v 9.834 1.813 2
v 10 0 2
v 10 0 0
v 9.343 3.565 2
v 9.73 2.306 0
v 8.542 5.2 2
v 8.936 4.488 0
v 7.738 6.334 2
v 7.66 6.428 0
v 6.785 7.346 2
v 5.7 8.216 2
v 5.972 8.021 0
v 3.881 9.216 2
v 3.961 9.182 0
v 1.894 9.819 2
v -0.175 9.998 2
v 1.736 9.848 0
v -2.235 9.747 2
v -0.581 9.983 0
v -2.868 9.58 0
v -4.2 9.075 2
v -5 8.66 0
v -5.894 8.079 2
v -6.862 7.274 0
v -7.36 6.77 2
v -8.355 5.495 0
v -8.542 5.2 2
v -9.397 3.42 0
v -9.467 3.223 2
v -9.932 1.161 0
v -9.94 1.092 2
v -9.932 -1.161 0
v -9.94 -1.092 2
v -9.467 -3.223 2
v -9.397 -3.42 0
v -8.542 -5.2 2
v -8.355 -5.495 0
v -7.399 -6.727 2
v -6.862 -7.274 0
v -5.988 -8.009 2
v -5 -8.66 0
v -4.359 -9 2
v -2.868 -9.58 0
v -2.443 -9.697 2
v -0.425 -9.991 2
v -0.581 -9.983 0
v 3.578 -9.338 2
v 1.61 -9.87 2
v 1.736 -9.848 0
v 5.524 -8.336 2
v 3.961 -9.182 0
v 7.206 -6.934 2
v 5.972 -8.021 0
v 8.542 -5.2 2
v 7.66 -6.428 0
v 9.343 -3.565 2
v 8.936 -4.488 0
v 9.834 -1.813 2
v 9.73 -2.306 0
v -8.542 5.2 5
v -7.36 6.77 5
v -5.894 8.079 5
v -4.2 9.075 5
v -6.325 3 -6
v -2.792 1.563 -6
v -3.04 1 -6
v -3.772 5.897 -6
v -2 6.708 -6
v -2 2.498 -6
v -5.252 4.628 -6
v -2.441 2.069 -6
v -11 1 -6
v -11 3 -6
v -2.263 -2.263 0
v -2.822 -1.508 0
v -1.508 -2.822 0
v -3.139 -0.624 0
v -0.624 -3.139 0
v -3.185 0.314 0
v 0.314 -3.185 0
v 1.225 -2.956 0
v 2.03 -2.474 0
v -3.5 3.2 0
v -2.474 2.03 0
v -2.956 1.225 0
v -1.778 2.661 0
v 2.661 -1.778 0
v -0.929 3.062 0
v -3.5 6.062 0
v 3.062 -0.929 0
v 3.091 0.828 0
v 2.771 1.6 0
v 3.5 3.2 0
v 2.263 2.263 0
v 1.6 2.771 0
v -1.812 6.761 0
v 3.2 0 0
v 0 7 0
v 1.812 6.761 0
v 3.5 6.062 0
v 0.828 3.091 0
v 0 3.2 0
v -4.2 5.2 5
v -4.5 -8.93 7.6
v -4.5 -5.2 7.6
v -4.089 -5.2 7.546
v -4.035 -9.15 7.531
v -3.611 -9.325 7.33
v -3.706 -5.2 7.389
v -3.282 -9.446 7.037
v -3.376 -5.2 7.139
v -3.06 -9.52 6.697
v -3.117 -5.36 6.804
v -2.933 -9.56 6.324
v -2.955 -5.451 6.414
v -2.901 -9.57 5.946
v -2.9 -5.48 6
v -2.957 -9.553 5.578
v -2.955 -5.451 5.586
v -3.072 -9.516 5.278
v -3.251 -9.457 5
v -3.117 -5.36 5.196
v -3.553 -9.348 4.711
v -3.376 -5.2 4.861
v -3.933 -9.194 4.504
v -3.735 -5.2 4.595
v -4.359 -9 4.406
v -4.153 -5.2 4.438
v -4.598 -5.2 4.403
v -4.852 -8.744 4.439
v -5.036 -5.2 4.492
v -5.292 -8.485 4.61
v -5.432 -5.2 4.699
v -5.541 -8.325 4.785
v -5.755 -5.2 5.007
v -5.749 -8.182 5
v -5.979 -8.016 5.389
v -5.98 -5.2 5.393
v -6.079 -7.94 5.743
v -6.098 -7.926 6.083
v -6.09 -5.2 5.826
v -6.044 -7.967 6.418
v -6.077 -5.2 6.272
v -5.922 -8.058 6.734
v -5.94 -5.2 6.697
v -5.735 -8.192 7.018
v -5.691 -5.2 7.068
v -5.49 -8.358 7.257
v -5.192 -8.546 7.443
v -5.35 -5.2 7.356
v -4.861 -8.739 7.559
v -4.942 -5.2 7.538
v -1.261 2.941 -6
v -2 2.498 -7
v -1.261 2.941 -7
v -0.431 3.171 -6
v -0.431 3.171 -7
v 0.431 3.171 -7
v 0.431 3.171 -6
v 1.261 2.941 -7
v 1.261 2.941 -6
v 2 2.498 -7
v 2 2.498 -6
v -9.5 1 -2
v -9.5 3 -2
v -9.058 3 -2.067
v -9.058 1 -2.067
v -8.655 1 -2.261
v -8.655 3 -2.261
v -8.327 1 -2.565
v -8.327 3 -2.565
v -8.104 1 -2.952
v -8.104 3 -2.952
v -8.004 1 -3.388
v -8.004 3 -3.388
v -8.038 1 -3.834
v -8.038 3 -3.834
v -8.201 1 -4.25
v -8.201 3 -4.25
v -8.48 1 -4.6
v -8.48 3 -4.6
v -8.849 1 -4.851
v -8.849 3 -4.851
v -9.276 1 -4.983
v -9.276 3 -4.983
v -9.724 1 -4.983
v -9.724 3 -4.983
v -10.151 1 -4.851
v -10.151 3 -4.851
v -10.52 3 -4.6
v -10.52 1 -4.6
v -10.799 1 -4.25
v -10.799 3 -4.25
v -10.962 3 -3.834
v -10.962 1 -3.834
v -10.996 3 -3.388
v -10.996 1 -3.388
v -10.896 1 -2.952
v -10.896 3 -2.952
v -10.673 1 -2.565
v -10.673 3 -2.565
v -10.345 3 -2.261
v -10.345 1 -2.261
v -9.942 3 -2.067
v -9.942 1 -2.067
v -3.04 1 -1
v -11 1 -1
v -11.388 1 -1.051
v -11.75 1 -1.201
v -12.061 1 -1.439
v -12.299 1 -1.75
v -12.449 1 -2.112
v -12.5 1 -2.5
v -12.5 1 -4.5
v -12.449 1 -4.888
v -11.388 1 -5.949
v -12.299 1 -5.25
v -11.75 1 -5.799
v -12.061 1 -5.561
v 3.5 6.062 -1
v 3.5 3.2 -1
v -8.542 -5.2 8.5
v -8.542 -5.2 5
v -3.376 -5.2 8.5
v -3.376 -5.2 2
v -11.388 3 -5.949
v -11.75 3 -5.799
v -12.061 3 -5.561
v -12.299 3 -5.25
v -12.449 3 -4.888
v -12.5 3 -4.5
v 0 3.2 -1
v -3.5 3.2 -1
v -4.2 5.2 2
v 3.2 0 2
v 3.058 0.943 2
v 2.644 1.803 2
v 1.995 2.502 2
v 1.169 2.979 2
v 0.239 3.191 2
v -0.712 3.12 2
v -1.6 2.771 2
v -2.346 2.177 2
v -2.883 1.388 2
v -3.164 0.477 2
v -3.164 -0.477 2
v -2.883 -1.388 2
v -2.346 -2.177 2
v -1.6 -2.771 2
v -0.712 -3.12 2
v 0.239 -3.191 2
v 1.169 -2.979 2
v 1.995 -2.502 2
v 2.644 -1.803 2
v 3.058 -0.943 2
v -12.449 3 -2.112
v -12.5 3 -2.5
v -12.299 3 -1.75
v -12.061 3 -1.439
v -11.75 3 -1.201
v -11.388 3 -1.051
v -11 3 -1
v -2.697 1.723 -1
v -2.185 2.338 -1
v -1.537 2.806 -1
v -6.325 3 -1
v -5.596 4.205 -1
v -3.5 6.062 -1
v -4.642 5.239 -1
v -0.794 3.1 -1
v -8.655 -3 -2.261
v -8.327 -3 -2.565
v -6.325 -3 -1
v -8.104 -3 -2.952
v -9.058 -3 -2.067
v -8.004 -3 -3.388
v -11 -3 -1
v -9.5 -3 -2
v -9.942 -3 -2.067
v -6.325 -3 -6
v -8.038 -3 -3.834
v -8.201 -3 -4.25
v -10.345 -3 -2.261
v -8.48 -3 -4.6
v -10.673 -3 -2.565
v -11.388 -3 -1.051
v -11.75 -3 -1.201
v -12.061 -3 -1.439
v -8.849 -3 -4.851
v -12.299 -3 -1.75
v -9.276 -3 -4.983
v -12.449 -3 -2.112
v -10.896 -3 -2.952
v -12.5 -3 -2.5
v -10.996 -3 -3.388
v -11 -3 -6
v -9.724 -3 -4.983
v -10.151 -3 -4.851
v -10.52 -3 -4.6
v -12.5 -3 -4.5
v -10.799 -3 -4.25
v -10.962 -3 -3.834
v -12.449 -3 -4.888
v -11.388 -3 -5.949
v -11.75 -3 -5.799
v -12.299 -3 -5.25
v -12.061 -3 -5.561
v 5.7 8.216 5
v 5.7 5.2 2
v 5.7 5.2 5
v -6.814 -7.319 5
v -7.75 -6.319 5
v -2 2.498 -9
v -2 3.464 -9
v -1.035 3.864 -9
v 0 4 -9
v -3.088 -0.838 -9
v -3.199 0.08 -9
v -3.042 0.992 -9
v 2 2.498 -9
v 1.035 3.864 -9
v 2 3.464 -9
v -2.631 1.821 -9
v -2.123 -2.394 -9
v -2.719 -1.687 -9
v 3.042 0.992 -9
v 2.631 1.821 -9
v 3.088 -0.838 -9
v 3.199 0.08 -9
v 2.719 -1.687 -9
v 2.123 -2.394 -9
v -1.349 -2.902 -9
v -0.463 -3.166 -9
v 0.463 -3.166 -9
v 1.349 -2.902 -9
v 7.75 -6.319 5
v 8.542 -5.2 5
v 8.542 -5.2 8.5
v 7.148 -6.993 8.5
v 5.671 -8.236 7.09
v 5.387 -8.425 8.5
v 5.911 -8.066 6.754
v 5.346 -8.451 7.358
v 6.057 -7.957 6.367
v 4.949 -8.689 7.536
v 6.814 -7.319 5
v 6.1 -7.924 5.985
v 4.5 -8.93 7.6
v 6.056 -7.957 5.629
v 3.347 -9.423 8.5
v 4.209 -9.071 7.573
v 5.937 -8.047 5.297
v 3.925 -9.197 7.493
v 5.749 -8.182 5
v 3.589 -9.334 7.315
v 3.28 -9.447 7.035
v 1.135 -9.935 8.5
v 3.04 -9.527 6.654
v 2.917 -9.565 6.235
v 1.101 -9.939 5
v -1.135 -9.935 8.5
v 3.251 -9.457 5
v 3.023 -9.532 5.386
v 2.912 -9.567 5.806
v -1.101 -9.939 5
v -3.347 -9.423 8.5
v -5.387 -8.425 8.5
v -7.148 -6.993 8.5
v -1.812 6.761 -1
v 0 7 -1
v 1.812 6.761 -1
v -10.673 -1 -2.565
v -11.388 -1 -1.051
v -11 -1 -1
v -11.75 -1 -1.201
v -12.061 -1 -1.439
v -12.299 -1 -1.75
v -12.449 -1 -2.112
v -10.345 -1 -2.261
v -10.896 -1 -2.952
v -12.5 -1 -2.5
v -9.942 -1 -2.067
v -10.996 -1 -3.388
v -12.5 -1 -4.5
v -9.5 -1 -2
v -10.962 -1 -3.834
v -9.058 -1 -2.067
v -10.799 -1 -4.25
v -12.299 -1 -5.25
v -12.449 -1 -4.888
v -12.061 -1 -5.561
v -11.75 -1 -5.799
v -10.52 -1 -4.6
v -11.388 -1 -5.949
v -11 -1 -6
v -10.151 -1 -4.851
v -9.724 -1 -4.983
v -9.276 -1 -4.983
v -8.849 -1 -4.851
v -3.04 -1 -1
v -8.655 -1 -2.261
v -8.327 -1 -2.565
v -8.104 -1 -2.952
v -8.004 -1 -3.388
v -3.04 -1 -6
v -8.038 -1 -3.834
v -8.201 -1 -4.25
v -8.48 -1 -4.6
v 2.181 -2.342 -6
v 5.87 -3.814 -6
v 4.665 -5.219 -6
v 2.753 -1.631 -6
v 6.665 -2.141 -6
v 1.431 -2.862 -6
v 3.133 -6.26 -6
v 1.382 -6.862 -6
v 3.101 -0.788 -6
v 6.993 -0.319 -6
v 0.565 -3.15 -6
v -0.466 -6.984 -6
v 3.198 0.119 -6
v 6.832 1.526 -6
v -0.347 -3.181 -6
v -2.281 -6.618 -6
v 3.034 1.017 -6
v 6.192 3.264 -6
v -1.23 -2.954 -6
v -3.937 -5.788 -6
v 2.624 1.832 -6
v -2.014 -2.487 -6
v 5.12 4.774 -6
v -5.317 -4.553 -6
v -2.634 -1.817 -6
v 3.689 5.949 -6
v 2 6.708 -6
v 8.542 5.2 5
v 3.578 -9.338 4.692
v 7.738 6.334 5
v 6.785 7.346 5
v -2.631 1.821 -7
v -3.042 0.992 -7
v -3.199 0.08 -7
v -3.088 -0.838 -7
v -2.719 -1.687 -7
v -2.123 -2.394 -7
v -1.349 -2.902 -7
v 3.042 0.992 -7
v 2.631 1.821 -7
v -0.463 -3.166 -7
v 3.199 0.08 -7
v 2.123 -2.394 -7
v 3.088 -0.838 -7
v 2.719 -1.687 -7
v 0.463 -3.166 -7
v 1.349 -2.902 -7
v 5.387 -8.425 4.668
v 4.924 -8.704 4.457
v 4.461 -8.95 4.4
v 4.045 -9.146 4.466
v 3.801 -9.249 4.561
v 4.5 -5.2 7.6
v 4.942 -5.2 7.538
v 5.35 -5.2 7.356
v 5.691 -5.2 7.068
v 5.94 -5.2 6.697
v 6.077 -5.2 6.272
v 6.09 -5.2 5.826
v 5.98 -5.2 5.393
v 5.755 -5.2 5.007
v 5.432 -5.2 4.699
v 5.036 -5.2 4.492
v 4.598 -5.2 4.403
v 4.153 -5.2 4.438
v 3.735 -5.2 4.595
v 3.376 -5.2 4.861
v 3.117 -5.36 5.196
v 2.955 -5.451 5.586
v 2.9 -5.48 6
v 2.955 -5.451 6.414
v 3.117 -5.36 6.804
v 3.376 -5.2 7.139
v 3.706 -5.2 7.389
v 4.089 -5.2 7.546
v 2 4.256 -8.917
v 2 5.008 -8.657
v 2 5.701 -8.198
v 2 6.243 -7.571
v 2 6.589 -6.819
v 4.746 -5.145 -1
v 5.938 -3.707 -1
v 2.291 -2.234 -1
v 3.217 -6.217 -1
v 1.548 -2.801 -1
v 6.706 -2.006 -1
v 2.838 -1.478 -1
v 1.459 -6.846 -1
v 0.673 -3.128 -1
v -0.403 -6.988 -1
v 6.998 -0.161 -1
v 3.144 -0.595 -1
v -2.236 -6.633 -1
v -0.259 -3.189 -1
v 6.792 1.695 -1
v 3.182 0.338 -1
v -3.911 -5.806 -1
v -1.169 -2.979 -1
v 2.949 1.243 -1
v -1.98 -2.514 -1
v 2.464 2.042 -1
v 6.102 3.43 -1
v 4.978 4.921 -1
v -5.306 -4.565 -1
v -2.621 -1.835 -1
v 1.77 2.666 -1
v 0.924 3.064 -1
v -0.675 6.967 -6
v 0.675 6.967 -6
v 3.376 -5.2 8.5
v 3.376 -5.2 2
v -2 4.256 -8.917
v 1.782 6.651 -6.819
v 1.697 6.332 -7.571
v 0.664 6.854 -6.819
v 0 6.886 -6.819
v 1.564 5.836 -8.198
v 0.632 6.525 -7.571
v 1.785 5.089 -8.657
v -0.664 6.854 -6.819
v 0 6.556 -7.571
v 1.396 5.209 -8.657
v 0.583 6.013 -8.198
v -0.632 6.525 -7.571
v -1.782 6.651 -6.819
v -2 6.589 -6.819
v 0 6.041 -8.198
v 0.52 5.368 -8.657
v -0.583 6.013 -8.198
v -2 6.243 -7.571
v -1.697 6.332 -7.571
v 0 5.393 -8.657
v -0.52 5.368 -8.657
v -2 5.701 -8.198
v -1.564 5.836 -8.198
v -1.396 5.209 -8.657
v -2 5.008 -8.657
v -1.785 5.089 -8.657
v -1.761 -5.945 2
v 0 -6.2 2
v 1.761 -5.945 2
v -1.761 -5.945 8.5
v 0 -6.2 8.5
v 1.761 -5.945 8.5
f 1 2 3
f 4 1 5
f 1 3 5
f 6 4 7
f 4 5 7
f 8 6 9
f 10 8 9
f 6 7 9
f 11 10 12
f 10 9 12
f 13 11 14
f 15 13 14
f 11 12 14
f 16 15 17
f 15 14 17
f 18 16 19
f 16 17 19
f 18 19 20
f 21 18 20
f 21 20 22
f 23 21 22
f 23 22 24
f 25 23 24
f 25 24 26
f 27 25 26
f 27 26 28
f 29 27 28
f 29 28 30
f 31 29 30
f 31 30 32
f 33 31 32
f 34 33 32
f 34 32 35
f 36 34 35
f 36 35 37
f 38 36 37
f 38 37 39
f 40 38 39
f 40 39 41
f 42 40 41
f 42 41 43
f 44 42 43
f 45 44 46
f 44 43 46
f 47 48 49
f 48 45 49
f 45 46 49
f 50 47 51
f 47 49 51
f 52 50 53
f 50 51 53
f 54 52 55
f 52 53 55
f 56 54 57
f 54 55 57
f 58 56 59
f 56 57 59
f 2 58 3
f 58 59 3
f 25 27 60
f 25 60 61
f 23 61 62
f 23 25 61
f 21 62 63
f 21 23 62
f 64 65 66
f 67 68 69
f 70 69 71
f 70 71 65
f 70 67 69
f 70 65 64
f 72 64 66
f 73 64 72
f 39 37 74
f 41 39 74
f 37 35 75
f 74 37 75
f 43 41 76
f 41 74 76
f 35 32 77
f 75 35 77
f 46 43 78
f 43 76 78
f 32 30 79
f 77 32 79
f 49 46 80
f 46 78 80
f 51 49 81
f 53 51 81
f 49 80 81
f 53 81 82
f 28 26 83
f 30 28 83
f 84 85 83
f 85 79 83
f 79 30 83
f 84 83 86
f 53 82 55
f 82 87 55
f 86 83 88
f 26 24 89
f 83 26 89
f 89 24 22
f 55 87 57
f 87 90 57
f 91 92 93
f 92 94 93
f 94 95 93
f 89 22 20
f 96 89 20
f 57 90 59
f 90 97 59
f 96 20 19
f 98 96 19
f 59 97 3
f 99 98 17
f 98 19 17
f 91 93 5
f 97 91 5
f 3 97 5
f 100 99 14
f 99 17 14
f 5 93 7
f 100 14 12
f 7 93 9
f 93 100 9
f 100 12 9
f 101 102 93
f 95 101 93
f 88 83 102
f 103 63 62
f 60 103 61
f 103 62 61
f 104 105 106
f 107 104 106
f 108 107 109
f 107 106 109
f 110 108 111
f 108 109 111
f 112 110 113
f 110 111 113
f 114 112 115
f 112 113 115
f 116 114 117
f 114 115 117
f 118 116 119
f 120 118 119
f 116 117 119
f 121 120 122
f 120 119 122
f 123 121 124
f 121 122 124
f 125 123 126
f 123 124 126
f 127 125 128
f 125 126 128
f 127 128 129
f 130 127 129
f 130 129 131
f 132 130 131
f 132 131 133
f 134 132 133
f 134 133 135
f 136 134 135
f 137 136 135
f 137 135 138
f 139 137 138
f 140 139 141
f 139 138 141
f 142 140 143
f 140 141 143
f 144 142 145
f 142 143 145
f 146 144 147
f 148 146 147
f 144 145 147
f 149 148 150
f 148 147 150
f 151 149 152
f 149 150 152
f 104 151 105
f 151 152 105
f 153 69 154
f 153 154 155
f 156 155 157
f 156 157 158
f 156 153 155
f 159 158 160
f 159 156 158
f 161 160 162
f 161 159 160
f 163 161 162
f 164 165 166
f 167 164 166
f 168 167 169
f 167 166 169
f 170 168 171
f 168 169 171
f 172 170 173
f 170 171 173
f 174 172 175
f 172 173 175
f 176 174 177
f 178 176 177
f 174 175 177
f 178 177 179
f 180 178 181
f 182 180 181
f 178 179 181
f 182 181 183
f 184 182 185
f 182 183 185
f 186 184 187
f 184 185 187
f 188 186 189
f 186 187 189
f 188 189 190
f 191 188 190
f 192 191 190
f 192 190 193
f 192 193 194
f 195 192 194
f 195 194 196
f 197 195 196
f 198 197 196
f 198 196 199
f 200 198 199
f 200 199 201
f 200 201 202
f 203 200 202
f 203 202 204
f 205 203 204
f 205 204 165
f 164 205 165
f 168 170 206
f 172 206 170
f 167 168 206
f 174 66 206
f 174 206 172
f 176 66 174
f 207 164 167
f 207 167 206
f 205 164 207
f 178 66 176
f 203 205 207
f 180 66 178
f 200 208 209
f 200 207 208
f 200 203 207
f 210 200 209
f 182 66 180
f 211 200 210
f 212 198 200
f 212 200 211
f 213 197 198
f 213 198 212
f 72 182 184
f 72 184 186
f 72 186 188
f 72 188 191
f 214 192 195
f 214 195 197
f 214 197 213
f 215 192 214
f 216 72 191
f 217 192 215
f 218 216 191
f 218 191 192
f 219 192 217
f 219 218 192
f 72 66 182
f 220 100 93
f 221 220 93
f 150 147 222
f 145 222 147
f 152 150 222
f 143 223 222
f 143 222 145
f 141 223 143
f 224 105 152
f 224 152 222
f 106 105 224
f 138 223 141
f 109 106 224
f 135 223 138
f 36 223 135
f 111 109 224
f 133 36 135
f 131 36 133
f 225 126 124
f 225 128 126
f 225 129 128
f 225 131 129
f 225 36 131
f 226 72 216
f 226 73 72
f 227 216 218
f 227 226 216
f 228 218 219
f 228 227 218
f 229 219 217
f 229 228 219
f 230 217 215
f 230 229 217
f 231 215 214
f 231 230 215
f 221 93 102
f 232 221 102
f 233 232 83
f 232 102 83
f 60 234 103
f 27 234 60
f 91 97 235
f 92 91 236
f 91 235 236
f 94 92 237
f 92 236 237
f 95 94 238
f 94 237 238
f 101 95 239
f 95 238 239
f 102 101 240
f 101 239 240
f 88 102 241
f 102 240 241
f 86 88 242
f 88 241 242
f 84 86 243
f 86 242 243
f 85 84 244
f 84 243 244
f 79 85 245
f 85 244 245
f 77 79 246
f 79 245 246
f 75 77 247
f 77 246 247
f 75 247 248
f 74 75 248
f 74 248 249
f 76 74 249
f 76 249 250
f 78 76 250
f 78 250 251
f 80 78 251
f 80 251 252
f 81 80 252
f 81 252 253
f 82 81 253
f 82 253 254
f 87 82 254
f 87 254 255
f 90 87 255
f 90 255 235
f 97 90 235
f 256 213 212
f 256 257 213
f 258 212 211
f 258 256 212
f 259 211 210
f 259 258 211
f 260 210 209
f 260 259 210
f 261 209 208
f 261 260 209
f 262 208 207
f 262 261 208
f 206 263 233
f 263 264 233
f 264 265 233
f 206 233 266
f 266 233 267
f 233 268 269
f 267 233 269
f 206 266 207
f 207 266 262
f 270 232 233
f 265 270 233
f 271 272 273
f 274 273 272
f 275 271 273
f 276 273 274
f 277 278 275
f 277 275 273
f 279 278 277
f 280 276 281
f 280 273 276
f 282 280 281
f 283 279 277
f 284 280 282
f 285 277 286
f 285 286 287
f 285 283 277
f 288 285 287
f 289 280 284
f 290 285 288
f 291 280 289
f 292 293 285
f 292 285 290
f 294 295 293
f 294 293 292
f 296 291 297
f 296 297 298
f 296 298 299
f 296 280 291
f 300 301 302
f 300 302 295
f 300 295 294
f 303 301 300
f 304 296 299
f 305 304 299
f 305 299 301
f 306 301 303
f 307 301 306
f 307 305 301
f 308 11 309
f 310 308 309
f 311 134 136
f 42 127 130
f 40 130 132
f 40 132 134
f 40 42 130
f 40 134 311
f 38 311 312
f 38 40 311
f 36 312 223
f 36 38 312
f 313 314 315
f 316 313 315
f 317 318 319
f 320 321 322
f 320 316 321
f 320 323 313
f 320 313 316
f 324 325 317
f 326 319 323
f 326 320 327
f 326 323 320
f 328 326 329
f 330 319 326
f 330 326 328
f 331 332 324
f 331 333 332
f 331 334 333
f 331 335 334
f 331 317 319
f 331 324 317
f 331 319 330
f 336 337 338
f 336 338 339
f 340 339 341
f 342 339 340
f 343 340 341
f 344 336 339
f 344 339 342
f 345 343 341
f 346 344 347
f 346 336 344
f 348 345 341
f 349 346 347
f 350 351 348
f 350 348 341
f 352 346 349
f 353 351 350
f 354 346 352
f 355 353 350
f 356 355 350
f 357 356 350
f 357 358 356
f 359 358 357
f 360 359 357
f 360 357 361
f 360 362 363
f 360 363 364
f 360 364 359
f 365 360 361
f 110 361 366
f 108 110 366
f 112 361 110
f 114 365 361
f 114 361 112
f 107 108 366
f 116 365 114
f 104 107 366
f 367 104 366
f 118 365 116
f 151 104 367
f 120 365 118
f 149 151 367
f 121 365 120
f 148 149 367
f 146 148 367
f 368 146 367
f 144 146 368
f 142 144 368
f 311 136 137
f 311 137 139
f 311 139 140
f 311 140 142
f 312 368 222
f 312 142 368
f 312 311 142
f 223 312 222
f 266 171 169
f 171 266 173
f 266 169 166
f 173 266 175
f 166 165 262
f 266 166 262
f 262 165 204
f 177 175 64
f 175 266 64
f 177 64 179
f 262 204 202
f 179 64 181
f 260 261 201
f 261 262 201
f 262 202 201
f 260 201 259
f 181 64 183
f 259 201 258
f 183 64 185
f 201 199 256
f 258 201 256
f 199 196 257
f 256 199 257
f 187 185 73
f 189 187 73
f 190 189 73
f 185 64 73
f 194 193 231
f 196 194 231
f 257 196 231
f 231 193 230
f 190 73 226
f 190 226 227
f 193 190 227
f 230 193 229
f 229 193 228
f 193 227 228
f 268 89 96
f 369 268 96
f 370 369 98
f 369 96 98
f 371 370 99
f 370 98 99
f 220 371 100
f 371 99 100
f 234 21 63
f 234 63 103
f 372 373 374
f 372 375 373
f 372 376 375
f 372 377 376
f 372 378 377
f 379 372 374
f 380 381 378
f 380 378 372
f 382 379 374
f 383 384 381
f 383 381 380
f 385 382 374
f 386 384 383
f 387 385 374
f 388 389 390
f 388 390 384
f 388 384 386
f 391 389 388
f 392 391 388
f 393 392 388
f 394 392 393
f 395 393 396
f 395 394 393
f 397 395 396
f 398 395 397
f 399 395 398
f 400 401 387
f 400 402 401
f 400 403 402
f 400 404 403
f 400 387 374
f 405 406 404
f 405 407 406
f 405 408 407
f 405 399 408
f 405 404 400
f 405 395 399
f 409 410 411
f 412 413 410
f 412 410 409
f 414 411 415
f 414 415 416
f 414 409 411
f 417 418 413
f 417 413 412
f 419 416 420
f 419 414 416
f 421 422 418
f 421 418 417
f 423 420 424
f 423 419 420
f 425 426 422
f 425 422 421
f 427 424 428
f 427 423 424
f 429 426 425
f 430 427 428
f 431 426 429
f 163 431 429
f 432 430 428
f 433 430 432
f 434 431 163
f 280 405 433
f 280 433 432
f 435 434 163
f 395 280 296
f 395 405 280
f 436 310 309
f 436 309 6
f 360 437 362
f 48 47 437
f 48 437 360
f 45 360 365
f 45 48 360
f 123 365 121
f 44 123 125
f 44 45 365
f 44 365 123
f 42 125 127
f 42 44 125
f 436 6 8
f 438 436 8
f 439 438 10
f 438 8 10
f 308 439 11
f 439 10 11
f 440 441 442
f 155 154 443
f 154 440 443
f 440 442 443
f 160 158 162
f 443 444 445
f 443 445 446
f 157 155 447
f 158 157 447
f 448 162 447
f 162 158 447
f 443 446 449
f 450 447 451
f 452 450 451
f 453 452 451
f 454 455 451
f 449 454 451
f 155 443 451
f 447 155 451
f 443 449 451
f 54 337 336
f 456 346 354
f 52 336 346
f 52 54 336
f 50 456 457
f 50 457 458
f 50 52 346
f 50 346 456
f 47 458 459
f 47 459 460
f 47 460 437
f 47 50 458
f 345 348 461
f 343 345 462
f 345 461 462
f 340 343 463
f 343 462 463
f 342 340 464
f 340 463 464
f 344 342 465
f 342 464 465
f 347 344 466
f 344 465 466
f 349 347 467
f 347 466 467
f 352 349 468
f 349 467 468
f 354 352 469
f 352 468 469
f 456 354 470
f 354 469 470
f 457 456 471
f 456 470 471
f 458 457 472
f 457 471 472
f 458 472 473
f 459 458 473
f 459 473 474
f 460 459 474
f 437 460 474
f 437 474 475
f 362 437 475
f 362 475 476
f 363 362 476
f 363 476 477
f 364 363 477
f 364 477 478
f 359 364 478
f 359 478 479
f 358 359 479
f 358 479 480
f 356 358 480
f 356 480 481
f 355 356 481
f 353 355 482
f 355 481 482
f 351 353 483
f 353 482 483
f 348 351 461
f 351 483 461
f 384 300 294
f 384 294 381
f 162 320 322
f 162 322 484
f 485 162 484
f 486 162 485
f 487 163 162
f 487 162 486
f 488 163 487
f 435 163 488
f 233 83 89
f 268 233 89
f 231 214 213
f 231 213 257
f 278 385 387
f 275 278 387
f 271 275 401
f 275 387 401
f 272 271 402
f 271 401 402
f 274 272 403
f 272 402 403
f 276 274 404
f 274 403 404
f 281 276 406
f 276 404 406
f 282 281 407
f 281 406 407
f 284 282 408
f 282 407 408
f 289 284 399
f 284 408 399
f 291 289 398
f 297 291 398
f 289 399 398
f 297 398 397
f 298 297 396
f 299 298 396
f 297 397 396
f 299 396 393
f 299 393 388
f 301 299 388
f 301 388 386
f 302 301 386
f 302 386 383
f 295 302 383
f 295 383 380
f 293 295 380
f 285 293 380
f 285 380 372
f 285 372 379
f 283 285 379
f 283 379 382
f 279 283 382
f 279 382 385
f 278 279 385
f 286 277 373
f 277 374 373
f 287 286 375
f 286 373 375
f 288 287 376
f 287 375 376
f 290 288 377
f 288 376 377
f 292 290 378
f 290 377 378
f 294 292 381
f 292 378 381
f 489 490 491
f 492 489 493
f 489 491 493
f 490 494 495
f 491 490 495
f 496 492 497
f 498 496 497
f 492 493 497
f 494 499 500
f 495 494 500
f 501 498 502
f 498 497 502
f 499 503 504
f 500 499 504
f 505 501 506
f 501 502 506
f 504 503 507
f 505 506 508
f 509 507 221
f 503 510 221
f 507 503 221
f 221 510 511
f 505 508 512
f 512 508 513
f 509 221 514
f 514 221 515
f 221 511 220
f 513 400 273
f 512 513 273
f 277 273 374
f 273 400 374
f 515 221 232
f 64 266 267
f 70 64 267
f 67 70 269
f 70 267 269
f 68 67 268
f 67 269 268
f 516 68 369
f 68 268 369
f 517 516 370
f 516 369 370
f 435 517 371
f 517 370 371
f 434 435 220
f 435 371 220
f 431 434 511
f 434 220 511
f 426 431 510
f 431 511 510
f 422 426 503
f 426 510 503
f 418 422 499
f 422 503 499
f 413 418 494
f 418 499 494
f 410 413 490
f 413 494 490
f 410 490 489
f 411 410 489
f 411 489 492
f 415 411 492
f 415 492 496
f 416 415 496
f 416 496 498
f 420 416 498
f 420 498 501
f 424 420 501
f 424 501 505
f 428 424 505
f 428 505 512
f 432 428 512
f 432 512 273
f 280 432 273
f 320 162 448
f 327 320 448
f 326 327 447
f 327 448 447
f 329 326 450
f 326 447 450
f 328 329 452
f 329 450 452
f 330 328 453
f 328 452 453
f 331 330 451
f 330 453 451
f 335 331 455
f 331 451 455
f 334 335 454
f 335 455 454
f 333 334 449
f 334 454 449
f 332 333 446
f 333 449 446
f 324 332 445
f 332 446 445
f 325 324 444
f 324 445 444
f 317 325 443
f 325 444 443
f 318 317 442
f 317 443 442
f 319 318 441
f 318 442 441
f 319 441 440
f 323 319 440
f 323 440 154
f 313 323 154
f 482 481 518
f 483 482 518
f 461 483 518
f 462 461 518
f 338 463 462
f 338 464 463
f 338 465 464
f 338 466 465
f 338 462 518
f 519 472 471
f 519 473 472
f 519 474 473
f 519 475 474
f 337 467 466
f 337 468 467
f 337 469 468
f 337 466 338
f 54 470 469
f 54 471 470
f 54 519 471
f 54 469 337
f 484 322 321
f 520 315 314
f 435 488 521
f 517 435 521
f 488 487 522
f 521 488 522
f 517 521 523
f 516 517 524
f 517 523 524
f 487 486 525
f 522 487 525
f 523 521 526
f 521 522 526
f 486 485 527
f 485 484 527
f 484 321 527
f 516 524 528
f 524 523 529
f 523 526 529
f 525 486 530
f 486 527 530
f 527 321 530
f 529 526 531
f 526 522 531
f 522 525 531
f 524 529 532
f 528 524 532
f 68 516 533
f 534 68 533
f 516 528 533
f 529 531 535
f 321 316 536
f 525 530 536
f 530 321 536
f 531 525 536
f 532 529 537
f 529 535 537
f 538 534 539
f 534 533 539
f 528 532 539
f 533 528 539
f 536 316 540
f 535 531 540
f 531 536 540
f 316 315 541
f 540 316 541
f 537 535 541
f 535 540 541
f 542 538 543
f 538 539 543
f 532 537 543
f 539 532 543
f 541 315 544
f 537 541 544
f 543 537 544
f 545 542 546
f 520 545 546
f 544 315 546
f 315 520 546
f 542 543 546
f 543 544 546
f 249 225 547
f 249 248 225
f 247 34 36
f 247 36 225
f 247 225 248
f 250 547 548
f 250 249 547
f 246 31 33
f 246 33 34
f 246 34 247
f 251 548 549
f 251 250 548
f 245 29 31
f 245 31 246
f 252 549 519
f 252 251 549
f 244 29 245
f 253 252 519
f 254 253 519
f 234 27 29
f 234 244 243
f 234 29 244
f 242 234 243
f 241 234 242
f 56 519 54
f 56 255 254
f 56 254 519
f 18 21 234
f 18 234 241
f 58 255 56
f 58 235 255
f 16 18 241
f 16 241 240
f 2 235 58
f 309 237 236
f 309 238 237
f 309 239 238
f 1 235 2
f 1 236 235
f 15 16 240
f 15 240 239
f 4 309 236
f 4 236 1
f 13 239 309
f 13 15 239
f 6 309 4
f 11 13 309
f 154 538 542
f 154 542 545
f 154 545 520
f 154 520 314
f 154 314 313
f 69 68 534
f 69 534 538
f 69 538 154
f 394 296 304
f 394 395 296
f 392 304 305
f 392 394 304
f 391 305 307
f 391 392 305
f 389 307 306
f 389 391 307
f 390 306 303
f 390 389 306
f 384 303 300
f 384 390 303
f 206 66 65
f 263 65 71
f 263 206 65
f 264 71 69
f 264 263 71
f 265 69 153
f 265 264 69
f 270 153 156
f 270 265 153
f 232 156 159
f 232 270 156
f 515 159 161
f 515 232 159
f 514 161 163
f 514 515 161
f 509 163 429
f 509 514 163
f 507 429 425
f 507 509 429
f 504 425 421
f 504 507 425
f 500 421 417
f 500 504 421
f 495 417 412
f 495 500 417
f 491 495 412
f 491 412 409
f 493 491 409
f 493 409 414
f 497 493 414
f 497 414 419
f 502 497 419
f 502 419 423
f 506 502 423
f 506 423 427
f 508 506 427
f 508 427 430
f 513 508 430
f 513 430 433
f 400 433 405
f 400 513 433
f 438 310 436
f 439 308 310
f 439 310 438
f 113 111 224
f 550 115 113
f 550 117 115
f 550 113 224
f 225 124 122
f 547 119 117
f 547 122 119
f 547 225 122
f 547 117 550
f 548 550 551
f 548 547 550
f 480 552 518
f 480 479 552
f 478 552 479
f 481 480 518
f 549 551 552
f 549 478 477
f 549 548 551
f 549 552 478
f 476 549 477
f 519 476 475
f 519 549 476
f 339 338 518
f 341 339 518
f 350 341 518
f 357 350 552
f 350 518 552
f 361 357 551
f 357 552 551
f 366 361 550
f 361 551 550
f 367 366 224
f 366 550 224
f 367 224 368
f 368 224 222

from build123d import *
from build123d.topology import SkipClean

# Parameters (mm, degrees)
SKETCH_1_R          = 10
EXTRUDE_1_DEPTH     = 2
EXTRUDE_2_DEPTH     = 3
SKETCH_3_R          = 3.2
CUT_EXTRUDE_1_DEPTH = 3
EXTRUDE_3_DEPTH     = 1
SKETCH_6_R          = 7
SKETCH_6_R_2        = 3.2
EXTRUDE_4_DEPTH     = 5
SKETCH_7_W          = 8.062767077
SKETCH_7_H          = 6
EXTRUDE_5_DEPTH     = 5
SKETCH_8_R          = 1.5
CUT_EXTRUDE_3_DEPTH = 20.006577809
CUT_EXTRUDE_4_DEPTH = 5
FILLET_7_R          = 1.5
EXTRUDE_6_DEPTH     = 3
EXTRUDE_START       = -2
SKETCH_12_R         = 3.2
EXTRUDE_7_DEPTH     = 2
FILLET_8_R          = 3
EXTRUDE_8_DEPTH     = 3.5
SKETCH_14_R         = 1.6
CUT_EXTRUDE_5_DEPTH = 22.640009284


with BuildPart() as part:
    # 草图1 → 凸台-拉伸1 (new body)
    with BuildSketch(Plane.XY):
        Circle(SKETCH_1_R)
    extrude(amount=EXTRUDE_1_DEPTH)

    # 草图2 → 凸台-拉伸2 (add)
    with SkipClean():  # the faces are left unmerged after this step: merging them gives an invalid solid
        with BuildSketch(Plane.XY.offset(2)):
            with BuildLine():
                Line((3.376388603, -5.2), (8.541662602, -5.2))
                ThreePointArc((8.541662602, -5.2), (6.403471398, -7.680856336), (3.578411207, -9.337824866))
                ThreePointArc((3.578411207, -9.337824866), (-0.425231333, -9.990954825), (-4.358898944, -9))
                ThreePointArc((-4.358898944, -9), (-6.724293423, -7.401613199), (-8.541662602, -5.2))
                Line((-8.541662602, -5.2), (-3.376388603, -5.2))
                ThreePointArc((-3.376388603, -5.2), (0, -6.2), (3.376388603, -5.2))
            make_face()
            with BuildLine():
                Line((-4.2, 5.2), (-8.541662602, 5.2))
                ThreePointArc((-8.541662602, 5.2), (-6.658968745, 7.460438007), (-4.2, 9.075241044))
                Line((-4.2, 9.075241044), (-4.2, 5.2))
            make_face()
            with BuildLine():
                Line((5.7, 5.2), (8.541662602, 5.2))
                ThreePointArc((8.541662602, 5.2), (7.278803227, 6.857041897), (5.7, 8.216446921))
                Line((5.7, 8.216446921), (5.7, 5.2))
            make_face()
        extrude(amount=EXTRUDE_2_DEPTH)

    # 草图3 → 切除-拉伸1 (cut)
    with SkipClean():  # the faces are left unmerged after this step: merging them gives an invalid solid
        with BuildSketch(Plane.XY.offset(2)):
            Circle(SKETCH_3_R)
        extrude(amount=-CUT_EXTRUDE_1_DEPTH, mode=Mode.SUBTRACT)

    # 草图5 → 凸台-拉伸3 (add)
    with SkipClean():  # the faces are left unmerged after this step: merging them gives an invalid solid
        with BuildSketch(Plane(origin=(0, 0, 0), x_dir=(-1, 0, 0), z_dir=(0, 0, -1))):
            with BuildLine():
                Line((-3.5, 6.062177826), (-3.5, 3.2))
                Line((-3.5, 3.2), (3.5, 3.2))
                Line((3.5, 3.2), (3.5, 6.062177826))
                ThreePointArc((3.5, 6.062177826), (0, 7), (-3.5, 6.062177826))
            make_face()
        extrude(amount=EXTRUDE_3_DEPTH)

    # 草图6 → 凸台-拉伸4 (add)
    with SkipClean():  # the faces are left unmerged after this step: merging them gives an invalid solid
        with BuildSketch(Plane(origin=(0, 0, -1), x_dir=(-1, 0, 0), z_dir=(0, 0, -1))):
            with Locations(Location((0, 0, 0), (0, 0, 120))):
                Circle(SKETCH_6_R)
            with Locations(Location((0, 0, 0), (0, 0, 180))):
                Circle(SKETCH_6_R_2, mode=Mode.SUBTRACT)
        extrude(amount=EXTRUDE_4_DEPTH)

    # 草图7 → 凸台-拉伸5 (add)
    with SkipClean():  # the faces are left unmerged after this step: merging them gives an invalid solid
        with BuildSketch(Plane(origin=(0, 0, -6), x_dir=(-1, 0, 0), z_dir=(0, 0, -1))):
            with Locations((8.468616461, 0)):
                Rectangle(SKETCH_7_W, SKETCH_7_H)
        extrude(amount=-EXTRUDE_5_DEPTH)

    # 草图8 → 切除-拉伸3 (cut, through all)
    with SkipClean():  # the faces are left unmerged after this step: merging them gives an invalid solid
        with BuildSketch(Plane(origin=(0, 3, 0), x_dir=(1, 0, 0), z_dir=(0, 1, 0))):
            with Locations(Location((-9.5, 3.5, 0), (0, 0, 270))):
                Circle(SKETCH_8_R)
        extrude(amount=-CUT_EXTRUDE_3_DEPTH, mode=Mode.SUBTRACT)

    # 草图9 → 切除-拉伸4 (cut)
    with SkipClean():  # the faces are left unmerged after this step: merging them gives an invalid solid
        with BuildSketch(Plane(origin=(0, 0, -6), x_dir=(-1, 0, 0), z_dir=(0, 0, -1))):
            Polygon((0, 0), (0, 1), (12.5, 1), (12.5, -1), (0, -1), align=None)
        extrude(amount=-CUT_EXTRUDE_4_DEPTH, mode=Mode.SUBTRACT)

    # 圆角7
    fillet_7_edges = [part.edges().sort_by_distance(p)[0] for p in [
        (-12.5, 2, -1),
        (-12.5, -2, -1),
        (-12.5, -2, -6),
        (-12.5, 2, -6),
    ]]
    fillet(fillet_7_edges, radius=FILLET_7_R)

    # 草图10 → 凸台-拉伸6 (add)
    with BuildSketch(Plane(origin=(0, 0, -6), x_dir=(-1, 0, 0), z_dir=(0, 0, -1))):
        with BuildLine():
            Line((2, 6.708203932), (2, 2.497999199))
            ThreePointArc((2, 2.497999199), (0, 3.2), (-2, 2.497999199))
            Line((-2, 2.497999199), (-2, 6.708203932))
            ThreePointArc((-2, 6.708203932), (0, 7), (2, 6.708203932))
        make_face()
    extrude(amount=EXTRUDE_6_DEPTH)

    # 草图12 → 凸台-拉伸7 (add)
    with BuildSketch(Plane(origin=(0, 0, -9), x_dir=(-1, 0, 0), z_dir=(0, 0, -1)).offset(EXTRUDE_START)):
        with Locations(Location((0, 0, 0), (0, 0, 180))):
            Circle(SKETCH_12_R)
    extrude(amount=EXTRUDE_7_DEPTH)

    # 圆角8
    fillet_8_edges = [part.edges().sort_by_distance(p)[0] for p in [
        (0, 7, -9),
    ]]
    fillet(fillet_8_edges, radius=FILLET_8_R - 0.0001)  # a hair under: the kernel refuses the full size

    # 草图13 → 凸台-拉伸8 (add)
    with BuildSketch(Plane.XY.offset(5)):
        with BuildLine():
            Line((3.376388603, -5.2), (8.541662602, -5.2))
            ThreePointArc((8.541662602, -5.2), (0, -10), (-8.541662602, -5.2))
            Line((-8.541662602, -5.2), (-3.376388603, -5.2))
            ThreePointArc((-3.376388603, -5.2), (0, -6.2), (3.376388603, -5.2))
        make_face()
    extrude(amount=EXTRUDE_8_DEPTH)

    # 草图14 → 切除-拉伸5 (cut, through all)
    with BuildSketch(Plane(origin=(0, -5.2, 0), x_dir=(1, 0, 0), z_dir=(0, 1, 0))):
        with Locations(Location((4.5, -6, 0), (0, 0, 270))):
            Circle(SKETCH_14_R)
        with Locations(Location((-4.5, -6, 0), (0, 0, 270))):
            Circle(SKETCH_14_R)
    extrude(amount=-CUT_EXTRUDE_5_DEPTH, mode=Mode.SUBTRACT)


solid = part.part
